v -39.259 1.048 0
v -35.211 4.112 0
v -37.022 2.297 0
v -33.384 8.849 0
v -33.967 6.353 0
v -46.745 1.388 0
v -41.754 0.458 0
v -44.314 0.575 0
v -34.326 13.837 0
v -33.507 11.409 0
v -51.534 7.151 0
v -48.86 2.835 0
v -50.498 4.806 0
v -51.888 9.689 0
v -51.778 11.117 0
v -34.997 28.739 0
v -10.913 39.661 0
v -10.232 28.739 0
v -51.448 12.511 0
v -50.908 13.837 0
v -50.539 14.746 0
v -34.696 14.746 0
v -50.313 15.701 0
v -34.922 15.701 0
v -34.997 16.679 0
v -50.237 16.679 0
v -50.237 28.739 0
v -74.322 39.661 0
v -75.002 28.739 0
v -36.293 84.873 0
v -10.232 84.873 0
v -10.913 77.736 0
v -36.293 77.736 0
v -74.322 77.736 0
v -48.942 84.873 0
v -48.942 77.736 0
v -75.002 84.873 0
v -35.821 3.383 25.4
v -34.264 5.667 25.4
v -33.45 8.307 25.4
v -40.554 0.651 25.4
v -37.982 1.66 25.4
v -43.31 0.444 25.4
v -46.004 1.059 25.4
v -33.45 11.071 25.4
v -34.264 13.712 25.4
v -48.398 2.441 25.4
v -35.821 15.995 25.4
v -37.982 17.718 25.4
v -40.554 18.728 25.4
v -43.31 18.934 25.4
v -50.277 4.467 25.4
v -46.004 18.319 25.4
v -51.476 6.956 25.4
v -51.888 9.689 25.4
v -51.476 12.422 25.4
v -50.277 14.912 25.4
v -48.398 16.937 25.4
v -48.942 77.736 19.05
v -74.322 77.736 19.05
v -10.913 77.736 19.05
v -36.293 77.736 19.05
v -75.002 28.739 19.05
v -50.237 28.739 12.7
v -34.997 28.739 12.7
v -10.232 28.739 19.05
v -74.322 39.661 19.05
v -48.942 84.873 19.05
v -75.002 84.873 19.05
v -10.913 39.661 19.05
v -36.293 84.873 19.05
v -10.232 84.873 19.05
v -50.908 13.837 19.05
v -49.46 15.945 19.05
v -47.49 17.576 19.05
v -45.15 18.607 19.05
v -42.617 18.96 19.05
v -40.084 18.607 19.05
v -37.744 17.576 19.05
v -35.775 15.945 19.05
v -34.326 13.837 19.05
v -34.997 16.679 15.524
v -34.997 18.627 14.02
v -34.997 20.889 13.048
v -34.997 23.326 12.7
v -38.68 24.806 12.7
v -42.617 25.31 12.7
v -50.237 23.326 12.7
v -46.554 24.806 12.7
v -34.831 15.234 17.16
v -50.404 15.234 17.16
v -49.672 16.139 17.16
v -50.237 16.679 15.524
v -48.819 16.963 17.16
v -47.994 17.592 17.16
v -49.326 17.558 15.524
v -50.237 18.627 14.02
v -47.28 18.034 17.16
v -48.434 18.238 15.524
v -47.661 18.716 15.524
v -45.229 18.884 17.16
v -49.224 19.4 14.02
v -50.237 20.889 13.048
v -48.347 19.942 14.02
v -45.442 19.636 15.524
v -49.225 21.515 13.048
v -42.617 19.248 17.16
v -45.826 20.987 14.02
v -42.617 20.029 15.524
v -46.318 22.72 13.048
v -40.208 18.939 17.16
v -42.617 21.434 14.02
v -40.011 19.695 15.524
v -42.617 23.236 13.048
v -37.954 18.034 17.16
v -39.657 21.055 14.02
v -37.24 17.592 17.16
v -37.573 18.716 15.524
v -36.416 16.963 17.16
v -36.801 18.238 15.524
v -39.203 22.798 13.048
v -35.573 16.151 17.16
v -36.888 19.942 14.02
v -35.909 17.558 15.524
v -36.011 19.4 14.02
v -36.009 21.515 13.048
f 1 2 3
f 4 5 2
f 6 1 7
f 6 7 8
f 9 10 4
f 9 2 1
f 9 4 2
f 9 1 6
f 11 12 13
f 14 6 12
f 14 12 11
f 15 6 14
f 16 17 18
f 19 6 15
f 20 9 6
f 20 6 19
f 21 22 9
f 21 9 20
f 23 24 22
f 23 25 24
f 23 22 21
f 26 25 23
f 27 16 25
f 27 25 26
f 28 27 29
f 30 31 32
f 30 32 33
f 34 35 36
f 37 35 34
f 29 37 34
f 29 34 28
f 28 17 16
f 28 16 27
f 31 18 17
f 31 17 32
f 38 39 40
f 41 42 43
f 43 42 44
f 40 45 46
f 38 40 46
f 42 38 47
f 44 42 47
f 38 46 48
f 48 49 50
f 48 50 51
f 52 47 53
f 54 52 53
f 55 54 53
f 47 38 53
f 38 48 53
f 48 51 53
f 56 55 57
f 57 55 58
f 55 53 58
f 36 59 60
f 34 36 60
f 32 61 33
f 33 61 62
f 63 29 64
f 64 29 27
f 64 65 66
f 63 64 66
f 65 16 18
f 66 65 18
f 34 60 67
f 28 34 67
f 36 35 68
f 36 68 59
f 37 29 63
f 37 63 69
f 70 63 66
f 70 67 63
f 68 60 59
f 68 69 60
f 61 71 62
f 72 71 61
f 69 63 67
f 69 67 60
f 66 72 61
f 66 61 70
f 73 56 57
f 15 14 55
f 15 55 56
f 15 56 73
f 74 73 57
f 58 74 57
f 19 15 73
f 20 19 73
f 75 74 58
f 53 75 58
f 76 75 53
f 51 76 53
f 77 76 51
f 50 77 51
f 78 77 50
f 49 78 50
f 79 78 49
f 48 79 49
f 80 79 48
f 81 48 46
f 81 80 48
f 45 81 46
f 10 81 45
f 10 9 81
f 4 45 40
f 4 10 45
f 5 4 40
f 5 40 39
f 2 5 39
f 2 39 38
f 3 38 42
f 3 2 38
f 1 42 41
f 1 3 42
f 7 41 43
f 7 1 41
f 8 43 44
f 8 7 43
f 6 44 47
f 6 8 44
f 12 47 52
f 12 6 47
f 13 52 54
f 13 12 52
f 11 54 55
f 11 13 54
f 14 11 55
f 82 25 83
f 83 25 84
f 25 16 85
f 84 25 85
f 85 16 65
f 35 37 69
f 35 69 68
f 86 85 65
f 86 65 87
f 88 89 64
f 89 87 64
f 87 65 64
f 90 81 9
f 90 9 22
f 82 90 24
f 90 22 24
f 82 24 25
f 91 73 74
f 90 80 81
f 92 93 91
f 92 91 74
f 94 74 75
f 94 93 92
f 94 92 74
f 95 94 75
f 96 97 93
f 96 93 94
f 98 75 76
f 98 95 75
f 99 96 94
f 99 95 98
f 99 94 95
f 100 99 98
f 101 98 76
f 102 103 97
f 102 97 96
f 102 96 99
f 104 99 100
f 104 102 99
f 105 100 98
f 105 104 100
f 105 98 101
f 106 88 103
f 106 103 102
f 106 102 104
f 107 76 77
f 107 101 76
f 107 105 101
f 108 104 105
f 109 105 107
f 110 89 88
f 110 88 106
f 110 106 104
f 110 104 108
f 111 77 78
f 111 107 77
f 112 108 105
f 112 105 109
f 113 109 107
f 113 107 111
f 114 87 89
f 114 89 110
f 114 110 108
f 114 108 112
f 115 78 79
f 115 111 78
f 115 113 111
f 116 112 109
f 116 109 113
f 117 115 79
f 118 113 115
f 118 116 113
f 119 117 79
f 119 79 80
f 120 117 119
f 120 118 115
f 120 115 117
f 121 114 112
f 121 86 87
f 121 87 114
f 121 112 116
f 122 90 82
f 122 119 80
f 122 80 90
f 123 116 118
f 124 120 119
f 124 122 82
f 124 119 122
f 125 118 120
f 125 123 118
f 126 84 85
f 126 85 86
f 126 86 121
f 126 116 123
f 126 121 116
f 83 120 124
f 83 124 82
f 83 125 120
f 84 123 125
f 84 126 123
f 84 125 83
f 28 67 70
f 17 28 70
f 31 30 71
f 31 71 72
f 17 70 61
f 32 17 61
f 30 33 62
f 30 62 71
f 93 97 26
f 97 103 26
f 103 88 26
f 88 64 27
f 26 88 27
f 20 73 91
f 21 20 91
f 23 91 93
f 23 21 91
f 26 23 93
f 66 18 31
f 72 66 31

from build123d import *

# Parameters (mm, degrees)
SKETCH4_W           = 64.77
SKETCH4_H           = 56.134
BOSS_EXTRUDE1_DEPTH = 19.05
CUT_EXTRUDE1_DEPTH  = 115.855093202
BOSS_EXTRUDE2_DEPTH = 19.05
SKETCH7_R           = 9.271
BOSS_EXTRUDE3_DEPTH = 25.4
FILLET1_R           = 6.35


with BuildPart() as part:
    # Sketch4 → Boss-Extrude1 (new body)
    with BuildSketch(Plane.XY):
        with Locations((-42.617275879, 56.806132071)):
            Rectangle(SKETCH4_W, SKETCH4_H)
    extrude(amount=BOSS_EXTRUDE1_DEPTH)

    # Sketch5 → Cut-Extrude1 (cut, through all)
    with BuildSketch(Plane.XY.offset(19.05)):
        Polygon((-74.321555879, 39.661132071), (-10.912995879, 39.661132071), (-10.912995879, 77.735732071), (-36.292675879, 77.735732071), (-36.292675879, 84.873132071), (-48.941875879, 84.873132071), (-48.941875879, 77.735732071), (-74.321555879, 77.735732071), align=None)
    extrude(amount=-CUT_EXTRUDE1_DEPTH, mode=Mode.SUBTRACT)

    # Sketch6 → Boss-Extrude2 (add)
    with BuildSketch(Plane.XZ.offset(-28.739132071)):
        Polygon((-42.617275879, 0), (-34.997275879, 0), (-34.997275879, 12.7), (-50.237275879, 12.7), (-50.237275879, 0), align=None)
    extrude(amount=BOSS_EXTRUDE2_DEPTH)

    # Sketch7 → Boss-Extrude3 (add)
    with BuildSketch(Plane(origin=(0, 0, 0), x_dir=(-1, 0, 0), z_dir=(0, 0, -1))):
        with Locations((42.617275879, 9.689132071)):
            Circle(SKETCH7_R)
    extrude(amount=-BOSS_EXTRUDE3_DEPTH)

    # Fillet1
    fillet1_edges = [part.edges().sort_by_distance(p)[0] for p in [
        (-50.237275879, 14.969950284, 6.35),
        (-42.617275879, 18.960132071, 12.7),
        (-34.997275879, 14.969950284, 6.35),
    ]]
    fillet(fillet1_edges, radius=FILLET1_R)


solid = part.part
